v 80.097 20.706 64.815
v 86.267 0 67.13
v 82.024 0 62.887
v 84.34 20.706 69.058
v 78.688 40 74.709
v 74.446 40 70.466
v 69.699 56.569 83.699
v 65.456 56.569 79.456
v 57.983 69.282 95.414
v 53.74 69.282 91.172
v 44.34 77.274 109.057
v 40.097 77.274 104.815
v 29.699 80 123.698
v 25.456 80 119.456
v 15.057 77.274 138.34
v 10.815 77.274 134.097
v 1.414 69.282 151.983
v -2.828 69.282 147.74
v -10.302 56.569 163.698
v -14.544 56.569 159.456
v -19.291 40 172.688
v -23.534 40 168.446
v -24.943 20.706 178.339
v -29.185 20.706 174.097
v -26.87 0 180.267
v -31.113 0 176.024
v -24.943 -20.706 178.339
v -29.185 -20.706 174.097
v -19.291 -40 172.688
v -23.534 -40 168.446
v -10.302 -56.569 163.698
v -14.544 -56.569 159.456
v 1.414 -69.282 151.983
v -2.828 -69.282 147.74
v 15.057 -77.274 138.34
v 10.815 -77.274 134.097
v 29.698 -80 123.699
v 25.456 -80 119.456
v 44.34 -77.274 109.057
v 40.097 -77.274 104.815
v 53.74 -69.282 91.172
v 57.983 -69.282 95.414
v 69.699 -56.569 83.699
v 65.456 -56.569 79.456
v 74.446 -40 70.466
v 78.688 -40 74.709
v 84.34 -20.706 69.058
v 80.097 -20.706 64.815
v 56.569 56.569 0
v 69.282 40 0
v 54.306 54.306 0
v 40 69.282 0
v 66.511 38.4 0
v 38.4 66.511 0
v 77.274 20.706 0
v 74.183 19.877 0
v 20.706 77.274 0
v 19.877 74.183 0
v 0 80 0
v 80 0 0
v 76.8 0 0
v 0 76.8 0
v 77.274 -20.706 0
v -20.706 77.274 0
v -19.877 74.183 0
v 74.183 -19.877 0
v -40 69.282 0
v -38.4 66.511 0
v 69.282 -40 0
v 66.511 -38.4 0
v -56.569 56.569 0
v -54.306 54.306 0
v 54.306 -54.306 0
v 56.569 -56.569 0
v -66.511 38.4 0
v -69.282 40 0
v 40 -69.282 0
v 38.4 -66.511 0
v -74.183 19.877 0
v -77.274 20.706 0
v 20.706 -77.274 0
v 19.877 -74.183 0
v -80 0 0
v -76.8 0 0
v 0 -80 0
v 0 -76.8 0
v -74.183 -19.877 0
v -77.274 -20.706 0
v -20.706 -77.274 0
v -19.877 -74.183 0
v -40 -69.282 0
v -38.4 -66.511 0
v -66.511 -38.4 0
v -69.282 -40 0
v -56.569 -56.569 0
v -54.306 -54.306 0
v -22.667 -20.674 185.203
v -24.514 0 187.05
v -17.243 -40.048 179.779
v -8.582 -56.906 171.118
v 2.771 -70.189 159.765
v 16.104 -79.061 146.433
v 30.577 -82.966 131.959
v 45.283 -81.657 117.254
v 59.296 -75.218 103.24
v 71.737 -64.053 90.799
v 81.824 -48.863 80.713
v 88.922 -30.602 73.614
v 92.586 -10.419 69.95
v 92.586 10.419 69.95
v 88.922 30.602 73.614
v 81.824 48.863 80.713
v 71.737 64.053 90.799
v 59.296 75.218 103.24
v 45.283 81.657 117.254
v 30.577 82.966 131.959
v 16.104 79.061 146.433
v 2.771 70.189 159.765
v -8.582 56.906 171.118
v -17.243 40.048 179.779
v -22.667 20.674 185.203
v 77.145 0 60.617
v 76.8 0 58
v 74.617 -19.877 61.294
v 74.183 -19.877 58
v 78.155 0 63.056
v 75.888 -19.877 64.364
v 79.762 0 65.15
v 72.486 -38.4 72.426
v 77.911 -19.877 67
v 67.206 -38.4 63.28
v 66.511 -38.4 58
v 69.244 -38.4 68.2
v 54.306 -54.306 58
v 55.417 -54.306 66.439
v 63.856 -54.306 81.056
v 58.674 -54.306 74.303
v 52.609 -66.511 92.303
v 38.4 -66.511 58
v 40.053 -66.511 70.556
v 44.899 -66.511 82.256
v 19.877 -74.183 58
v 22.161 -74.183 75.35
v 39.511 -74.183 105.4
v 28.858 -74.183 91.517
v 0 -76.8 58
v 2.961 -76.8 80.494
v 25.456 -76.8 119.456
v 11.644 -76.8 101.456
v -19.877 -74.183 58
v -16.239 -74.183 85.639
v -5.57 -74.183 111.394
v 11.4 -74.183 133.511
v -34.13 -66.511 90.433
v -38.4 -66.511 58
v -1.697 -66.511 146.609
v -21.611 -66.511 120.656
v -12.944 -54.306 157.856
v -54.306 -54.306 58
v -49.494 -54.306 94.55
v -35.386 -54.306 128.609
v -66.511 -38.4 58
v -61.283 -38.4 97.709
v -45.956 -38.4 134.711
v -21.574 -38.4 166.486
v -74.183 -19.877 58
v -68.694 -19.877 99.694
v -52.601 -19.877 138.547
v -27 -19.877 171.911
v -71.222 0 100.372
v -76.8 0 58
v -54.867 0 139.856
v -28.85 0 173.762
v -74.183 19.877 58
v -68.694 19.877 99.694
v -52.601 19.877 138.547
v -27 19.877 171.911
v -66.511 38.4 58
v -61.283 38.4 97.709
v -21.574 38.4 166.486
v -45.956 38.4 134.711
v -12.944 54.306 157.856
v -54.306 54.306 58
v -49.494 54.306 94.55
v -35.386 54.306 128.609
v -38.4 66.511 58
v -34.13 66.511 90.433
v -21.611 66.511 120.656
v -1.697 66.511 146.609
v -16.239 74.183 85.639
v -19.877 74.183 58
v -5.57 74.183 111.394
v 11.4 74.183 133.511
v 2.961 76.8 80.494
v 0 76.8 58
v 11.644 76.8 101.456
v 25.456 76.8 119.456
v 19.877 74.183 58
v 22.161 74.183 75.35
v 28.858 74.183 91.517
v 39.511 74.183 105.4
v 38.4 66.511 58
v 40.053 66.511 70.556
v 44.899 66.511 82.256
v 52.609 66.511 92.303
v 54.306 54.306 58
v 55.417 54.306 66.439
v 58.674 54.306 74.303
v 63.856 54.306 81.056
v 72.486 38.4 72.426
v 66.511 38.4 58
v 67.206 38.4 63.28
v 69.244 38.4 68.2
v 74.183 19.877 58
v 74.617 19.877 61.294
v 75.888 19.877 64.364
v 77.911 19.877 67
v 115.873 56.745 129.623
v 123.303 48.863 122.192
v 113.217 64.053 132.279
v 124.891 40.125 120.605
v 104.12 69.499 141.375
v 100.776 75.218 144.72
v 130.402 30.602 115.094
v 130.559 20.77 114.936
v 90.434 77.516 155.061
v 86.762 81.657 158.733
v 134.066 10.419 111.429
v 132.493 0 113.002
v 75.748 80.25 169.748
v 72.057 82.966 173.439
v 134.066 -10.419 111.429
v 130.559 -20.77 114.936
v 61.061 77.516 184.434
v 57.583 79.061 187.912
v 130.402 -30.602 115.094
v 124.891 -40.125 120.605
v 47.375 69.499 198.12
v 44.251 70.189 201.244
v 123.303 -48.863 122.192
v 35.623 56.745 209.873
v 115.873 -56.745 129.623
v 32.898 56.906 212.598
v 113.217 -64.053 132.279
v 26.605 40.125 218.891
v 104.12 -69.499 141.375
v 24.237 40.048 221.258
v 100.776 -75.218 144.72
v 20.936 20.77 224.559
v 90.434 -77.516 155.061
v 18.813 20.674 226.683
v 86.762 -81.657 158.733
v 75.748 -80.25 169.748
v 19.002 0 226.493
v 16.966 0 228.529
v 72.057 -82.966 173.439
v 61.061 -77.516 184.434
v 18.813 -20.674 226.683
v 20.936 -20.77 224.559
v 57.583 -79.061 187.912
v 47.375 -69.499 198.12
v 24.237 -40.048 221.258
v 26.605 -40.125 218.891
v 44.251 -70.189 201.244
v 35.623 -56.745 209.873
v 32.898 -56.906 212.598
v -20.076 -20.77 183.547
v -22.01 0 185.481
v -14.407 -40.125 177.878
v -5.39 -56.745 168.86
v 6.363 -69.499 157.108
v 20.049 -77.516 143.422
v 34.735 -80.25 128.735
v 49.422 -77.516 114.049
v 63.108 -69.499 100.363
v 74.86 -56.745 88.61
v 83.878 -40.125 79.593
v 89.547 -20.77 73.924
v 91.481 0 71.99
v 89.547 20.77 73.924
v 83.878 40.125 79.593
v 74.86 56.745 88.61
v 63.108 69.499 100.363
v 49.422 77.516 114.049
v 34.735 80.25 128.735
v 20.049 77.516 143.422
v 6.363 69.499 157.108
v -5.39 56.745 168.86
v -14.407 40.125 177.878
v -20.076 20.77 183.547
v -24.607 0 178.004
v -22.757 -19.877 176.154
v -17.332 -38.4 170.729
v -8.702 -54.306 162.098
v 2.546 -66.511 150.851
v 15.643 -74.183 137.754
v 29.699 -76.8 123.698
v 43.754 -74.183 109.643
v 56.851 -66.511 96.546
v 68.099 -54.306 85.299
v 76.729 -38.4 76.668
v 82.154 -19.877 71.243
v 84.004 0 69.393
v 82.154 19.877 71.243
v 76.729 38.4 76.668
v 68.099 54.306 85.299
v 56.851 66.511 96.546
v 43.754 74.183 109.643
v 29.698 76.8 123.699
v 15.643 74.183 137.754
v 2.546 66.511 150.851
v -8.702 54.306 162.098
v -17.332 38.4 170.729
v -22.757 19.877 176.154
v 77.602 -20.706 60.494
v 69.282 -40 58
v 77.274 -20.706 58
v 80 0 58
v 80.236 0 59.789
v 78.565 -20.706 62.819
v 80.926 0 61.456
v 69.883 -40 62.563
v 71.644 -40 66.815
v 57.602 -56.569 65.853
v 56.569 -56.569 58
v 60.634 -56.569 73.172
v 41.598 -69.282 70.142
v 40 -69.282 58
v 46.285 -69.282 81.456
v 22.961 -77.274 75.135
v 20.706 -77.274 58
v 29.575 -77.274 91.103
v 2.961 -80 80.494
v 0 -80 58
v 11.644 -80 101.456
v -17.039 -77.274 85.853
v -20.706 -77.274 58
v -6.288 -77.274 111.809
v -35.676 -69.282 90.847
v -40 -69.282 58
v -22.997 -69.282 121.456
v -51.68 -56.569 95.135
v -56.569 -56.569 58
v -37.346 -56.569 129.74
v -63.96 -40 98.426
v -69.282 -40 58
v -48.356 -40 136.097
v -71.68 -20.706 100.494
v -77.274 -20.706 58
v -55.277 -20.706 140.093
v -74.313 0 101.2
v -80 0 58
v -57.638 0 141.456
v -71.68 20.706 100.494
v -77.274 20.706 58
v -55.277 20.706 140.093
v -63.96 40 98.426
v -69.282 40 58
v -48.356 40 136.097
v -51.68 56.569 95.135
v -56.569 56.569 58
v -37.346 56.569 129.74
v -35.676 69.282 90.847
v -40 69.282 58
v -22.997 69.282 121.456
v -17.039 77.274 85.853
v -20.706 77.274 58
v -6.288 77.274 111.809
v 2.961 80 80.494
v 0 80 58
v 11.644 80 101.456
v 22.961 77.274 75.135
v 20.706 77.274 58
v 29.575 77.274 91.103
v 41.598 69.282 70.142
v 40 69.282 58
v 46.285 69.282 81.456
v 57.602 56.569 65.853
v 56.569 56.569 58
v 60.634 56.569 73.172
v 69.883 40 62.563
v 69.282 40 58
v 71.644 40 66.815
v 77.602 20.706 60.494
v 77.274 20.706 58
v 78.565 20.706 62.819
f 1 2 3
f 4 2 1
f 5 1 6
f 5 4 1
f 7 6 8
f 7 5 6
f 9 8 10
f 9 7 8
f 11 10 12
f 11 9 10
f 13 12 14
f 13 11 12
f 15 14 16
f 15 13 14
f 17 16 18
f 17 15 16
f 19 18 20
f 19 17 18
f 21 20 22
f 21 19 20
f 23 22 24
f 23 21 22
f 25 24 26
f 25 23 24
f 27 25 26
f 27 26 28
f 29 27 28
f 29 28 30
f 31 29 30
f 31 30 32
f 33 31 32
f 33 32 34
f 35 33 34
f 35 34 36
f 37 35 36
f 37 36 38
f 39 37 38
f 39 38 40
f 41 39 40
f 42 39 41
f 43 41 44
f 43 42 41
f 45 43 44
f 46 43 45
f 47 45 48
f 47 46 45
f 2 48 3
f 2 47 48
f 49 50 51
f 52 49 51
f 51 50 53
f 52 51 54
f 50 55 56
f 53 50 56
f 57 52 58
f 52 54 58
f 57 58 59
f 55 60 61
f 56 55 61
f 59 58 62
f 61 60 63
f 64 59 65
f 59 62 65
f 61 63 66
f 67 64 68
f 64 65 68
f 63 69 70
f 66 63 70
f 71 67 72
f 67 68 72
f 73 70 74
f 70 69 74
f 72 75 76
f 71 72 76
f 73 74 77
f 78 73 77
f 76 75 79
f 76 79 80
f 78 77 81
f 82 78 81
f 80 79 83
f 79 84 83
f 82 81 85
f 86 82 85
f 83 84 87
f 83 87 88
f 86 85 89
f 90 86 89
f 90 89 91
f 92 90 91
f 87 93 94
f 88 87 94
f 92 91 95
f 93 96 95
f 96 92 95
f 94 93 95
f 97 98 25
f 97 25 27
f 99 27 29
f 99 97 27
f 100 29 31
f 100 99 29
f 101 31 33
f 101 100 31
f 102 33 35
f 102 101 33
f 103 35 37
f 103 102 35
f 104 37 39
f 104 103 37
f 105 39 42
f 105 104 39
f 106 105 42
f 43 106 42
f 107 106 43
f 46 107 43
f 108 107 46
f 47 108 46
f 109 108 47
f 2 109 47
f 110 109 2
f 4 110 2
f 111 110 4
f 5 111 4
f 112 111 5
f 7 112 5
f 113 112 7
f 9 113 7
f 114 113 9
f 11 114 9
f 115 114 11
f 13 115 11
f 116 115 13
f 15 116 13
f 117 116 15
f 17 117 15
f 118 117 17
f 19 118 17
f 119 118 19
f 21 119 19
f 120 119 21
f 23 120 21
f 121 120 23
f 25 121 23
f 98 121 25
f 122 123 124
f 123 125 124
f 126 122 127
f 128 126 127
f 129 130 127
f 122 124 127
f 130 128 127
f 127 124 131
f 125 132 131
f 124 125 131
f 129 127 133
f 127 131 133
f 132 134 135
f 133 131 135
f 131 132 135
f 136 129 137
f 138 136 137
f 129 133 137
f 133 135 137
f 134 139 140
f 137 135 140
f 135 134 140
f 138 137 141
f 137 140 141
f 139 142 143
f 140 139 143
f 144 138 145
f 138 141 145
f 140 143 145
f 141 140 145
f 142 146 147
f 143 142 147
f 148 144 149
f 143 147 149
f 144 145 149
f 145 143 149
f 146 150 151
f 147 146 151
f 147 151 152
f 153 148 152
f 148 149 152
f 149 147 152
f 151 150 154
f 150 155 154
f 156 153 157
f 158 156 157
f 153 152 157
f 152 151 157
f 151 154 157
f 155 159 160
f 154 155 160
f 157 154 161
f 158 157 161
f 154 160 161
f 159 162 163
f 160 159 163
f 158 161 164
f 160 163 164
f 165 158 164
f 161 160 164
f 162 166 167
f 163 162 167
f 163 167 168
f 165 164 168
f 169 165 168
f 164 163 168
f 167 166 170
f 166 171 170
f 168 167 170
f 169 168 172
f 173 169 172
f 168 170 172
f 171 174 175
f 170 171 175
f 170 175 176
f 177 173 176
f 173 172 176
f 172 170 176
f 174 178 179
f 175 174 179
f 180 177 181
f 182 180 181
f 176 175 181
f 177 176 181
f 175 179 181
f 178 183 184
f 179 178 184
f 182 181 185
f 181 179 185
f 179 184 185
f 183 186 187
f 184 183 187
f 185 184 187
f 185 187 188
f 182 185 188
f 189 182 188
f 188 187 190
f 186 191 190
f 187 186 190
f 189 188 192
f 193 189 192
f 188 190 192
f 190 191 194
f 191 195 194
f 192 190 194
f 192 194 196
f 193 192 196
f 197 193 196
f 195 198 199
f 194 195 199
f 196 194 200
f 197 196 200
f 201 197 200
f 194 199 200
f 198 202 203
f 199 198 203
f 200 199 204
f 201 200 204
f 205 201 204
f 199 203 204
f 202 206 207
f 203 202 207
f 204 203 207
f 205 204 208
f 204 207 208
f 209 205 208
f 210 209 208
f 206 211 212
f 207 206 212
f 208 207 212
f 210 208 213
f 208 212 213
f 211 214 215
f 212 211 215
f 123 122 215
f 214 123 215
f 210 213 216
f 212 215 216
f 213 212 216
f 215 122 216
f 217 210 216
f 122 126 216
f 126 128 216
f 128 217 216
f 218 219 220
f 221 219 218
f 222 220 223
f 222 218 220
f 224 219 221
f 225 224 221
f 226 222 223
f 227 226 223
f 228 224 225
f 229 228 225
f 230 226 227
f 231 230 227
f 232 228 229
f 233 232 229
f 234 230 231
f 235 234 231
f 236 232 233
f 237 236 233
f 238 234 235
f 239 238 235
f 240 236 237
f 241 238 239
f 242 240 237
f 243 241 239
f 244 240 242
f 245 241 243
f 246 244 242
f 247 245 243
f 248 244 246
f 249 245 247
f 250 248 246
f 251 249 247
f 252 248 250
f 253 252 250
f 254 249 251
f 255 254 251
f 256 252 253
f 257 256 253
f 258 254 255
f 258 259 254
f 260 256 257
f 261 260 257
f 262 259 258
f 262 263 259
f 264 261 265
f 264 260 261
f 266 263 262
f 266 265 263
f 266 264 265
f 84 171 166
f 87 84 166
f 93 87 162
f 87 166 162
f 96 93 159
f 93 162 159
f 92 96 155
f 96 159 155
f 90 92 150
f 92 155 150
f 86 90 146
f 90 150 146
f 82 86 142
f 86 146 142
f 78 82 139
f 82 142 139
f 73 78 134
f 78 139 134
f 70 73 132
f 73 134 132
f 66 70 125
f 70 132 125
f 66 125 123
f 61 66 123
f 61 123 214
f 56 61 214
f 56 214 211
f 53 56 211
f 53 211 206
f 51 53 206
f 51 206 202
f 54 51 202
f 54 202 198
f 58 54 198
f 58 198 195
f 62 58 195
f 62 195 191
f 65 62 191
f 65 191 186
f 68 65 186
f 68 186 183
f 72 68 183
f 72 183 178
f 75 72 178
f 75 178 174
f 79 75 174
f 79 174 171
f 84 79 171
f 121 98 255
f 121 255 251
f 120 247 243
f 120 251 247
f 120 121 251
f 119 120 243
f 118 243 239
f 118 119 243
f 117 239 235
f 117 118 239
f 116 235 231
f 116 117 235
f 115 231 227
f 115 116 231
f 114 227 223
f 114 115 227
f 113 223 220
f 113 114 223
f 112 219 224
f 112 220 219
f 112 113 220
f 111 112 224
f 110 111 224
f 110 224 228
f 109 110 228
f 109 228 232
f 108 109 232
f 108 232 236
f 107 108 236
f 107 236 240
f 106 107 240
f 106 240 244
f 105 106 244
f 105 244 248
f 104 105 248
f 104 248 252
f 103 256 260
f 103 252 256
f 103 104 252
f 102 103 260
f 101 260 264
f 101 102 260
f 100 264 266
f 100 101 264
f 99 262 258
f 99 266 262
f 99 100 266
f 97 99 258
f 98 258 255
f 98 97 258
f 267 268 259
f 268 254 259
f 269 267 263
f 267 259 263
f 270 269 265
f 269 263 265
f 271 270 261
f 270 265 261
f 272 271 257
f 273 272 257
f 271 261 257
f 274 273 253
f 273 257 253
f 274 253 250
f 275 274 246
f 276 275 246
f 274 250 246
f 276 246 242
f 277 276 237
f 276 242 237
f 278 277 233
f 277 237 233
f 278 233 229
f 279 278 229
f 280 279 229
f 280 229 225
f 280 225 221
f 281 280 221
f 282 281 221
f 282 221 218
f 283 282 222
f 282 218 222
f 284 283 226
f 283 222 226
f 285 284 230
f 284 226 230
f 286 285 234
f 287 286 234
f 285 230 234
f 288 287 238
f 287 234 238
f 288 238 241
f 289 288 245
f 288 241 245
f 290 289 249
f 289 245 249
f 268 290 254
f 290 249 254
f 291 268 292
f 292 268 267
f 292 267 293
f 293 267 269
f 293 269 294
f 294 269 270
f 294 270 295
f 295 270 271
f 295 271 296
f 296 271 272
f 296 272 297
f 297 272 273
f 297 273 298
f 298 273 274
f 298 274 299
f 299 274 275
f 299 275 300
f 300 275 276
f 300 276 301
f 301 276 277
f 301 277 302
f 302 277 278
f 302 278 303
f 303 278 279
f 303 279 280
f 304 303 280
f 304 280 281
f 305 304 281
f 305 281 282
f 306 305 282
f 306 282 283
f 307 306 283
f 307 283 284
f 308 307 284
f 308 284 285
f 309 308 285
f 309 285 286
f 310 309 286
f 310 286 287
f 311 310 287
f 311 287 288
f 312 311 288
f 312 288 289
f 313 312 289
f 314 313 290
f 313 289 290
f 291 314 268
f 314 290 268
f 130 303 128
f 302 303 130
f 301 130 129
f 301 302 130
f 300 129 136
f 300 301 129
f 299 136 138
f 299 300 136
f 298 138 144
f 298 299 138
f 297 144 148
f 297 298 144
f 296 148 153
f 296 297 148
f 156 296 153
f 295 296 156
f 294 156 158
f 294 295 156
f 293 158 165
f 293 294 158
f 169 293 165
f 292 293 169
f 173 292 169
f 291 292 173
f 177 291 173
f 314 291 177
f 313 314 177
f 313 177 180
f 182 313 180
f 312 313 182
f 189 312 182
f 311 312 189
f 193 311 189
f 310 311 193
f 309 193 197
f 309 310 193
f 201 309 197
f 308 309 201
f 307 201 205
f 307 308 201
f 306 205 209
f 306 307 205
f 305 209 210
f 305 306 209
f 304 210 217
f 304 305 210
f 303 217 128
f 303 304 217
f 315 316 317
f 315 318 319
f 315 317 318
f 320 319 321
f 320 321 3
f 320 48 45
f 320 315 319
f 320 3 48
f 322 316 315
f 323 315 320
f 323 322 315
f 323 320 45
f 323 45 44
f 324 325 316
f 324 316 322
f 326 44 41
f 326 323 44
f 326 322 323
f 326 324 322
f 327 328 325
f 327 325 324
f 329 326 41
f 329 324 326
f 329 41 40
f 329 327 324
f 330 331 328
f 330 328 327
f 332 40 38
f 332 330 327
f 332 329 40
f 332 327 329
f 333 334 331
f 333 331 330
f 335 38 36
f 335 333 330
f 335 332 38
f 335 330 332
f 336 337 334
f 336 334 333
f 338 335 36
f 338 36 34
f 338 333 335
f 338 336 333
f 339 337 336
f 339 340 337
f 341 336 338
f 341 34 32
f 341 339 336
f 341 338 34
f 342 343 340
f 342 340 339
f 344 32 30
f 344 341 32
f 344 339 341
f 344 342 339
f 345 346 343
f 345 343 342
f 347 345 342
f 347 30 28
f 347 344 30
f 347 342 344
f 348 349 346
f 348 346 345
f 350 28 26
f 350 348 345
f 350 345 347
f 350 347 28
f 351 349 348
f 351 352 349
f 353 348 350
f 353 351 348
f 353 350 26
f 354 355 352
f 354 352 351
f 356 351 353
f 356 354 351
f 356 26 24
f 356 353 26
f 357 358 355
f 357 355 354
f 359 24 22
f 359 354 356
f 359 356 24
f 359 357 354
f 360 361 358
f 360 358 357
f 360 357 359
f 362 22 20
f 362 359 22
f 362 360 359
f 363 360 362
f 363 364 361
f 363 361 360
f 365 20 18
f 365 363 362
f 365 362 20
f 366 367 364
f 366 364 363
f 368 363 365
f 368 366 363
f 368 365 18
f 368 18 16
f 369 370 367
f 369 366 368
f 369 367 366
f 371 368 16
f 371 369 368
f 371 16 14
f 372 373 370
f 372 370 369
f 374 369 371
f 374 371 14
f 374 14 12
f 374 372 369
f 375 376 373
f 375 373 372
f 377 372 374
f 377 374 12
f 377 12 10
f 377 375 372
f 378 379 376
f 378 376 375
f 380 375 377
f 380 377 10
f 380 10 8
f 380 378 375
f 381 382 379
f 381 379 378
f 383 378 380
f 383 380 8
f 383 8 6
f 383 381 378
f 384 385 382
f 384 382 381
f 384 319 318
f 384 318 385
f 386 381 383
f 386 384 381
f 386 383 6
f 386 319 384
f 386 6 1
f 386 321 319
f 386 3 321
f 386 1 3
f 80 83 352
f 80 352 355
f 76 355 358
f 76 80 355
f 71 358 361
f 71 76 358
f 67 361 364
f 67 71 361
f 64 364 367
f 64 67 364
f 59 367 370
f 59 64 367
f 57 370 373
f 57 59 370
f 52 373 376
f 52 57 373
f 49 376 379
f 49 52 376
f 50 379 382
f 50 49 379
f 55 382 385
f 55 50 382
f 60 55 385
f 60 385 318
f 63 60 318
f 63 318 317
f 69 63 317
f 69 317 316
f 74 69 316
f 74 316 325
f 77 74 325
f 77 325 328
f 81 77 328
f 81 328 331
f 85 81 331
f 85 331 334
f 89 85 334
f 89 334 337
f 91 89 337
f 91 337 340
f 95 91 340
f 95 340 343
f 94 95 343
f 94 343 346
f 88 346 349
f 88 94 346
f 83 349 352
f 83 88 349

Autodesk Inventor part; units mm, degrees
ref_plane "YZ Plane" through (0, 0, 0) normal (1, 0, 0) x (0, 1, 0)
ref_plane "XZ Plane" through (0, 0, 0) normal (0, 1, 0) x (-1, 0, 0)
ref_plane "XY Plane" through (0, 0, 0) normal (0, 0, 1) x (1, 0, 0)
sketch "Sketch1" plane through (0, 0, 0) normal (0, 1, 0) x (-1, 0, 0)
  line L0 (0, 0) -> (0, 58)
  line L1 (0, 0) -> (76.8, 0) construction
  line L2 (76.8, 0) -> (76.8, 58)
  line L3 (76.8, 58) -> (80, 58)
  line L4 (80, 58) -> (80, 0)
  line L5 (80, 0) -> (76.8, 0)
  line L6 (0, 58) -> (76.8, 58) construction
  dimension "d0" = 3.2
  dimension "d1" = 58
  dimension "d2" = 160
revolve "Revolution1" add sketch "Sketch1" angle 360 about axis through (0, 0, 0) along (0, 0, 1)
sketch "Sketch2" plane through (0, 0, 0) normal (0, 1, 0) x (-1, 0, 0)
  line L0 (0, 94) -> (-29.6985, 123.6985) construction
  line L1 (-29.6985, 123.6985) -> (-75.7477, 169.7477) construction
  line L2 (-75.7477, 169.7477) -> (-19.0023, 226.493) construction
  line L3 (-19.0023, 226.493) -> (-16.9659, 228.5294)
  line L4 (-16.9659, 228.5294) -> (24.5135, 187.05)
  line L5 (24.5135, 187.05) -> (26.8701, 180.267)
  line L6 (26.8701, 180.267) -> (24.6073, 178.0043)
  line L7 (24.6073, 178.0043) -> (22.0099, 185.4808)
  line L8 (22.0099, 185.4808) -> (-19.0023, 226.493)
  line L9 (22.0099, 185.4808) -> (-34.7355, 128.7355) construction
  line L10 (-29.6985, 123.6985) -> (24.6073, 178.0043) construction
  line L11 (-29.6985, 123.6985) -> (-25.4558, 119.4558)
  line L12 (-80, 58) -> (80, 58) projected
  line L13 (0, 94) -> (0, 58) construction
  arc A0 (0, 58) -> (-25.4558, 119.4558) centre (-86.9117, 58) ccw
  dimension "d5" = 160.5
  dimension "d6" = 2.88
  dimension "d7" = 58
  dimension "d8" = 160
  dimension "d9" = 3.2
  dimension "d10" = 42
  dimension "d11" = 2.88
  dimension "d12" = 45
  dimension "d13" = 36
sketch "Sketch3" plane through (0, 0, 58) normal (0, 0, 1) x (1, 0, 0)
  circle A0 centre (0, 0) radius 76.8
  circle A1 centre (0, 0) radius 80
  circle A2 centre (0, 0) radius 80 projected
  circle A3 centre (0, 0) radius 76.8 projected
sweep "Sweep1" add profiles "Sketch3" path "Sketch2" path curves A0 L11
revolve "Revolution2" add sketch "Sketch2" angle 360 about axis through (29.6985, 0, 123.6985) along (0.7071068, 0, 0.7071068)
equation "\"d5\" = Ds"
equation "\"d6\" = e2"
equation "\"d7\" = L1"
equation "\"d8\" = De"
equation "\"d9\" = e"
equation "\"d10\" = z2"
equation "\"d11\" = e2"
equation "\"d13\" = z1"
equation "\"d0\" = e"
equation "\"d1\" = L1"
equation "\"d2\" = De"
equation "\"z1\" = 36"
equation "\"L1\" = 58"
equation "\"De\" = 160"
equation "\"e\" = 3.2"
equation "\"z2\" = 42"
equation "\"Ds\" = 160.5"
equation "\"e2\" = 0.9 * e"
equation "\"e3\" = 0.75 * e"
equation "\"Size_Designation\" = 1.2345"
properties part number "ISO 3633 45 Deg Bend with Single Socket for Cemented Type Joints DN160" material "PVC, Unplasticized"
